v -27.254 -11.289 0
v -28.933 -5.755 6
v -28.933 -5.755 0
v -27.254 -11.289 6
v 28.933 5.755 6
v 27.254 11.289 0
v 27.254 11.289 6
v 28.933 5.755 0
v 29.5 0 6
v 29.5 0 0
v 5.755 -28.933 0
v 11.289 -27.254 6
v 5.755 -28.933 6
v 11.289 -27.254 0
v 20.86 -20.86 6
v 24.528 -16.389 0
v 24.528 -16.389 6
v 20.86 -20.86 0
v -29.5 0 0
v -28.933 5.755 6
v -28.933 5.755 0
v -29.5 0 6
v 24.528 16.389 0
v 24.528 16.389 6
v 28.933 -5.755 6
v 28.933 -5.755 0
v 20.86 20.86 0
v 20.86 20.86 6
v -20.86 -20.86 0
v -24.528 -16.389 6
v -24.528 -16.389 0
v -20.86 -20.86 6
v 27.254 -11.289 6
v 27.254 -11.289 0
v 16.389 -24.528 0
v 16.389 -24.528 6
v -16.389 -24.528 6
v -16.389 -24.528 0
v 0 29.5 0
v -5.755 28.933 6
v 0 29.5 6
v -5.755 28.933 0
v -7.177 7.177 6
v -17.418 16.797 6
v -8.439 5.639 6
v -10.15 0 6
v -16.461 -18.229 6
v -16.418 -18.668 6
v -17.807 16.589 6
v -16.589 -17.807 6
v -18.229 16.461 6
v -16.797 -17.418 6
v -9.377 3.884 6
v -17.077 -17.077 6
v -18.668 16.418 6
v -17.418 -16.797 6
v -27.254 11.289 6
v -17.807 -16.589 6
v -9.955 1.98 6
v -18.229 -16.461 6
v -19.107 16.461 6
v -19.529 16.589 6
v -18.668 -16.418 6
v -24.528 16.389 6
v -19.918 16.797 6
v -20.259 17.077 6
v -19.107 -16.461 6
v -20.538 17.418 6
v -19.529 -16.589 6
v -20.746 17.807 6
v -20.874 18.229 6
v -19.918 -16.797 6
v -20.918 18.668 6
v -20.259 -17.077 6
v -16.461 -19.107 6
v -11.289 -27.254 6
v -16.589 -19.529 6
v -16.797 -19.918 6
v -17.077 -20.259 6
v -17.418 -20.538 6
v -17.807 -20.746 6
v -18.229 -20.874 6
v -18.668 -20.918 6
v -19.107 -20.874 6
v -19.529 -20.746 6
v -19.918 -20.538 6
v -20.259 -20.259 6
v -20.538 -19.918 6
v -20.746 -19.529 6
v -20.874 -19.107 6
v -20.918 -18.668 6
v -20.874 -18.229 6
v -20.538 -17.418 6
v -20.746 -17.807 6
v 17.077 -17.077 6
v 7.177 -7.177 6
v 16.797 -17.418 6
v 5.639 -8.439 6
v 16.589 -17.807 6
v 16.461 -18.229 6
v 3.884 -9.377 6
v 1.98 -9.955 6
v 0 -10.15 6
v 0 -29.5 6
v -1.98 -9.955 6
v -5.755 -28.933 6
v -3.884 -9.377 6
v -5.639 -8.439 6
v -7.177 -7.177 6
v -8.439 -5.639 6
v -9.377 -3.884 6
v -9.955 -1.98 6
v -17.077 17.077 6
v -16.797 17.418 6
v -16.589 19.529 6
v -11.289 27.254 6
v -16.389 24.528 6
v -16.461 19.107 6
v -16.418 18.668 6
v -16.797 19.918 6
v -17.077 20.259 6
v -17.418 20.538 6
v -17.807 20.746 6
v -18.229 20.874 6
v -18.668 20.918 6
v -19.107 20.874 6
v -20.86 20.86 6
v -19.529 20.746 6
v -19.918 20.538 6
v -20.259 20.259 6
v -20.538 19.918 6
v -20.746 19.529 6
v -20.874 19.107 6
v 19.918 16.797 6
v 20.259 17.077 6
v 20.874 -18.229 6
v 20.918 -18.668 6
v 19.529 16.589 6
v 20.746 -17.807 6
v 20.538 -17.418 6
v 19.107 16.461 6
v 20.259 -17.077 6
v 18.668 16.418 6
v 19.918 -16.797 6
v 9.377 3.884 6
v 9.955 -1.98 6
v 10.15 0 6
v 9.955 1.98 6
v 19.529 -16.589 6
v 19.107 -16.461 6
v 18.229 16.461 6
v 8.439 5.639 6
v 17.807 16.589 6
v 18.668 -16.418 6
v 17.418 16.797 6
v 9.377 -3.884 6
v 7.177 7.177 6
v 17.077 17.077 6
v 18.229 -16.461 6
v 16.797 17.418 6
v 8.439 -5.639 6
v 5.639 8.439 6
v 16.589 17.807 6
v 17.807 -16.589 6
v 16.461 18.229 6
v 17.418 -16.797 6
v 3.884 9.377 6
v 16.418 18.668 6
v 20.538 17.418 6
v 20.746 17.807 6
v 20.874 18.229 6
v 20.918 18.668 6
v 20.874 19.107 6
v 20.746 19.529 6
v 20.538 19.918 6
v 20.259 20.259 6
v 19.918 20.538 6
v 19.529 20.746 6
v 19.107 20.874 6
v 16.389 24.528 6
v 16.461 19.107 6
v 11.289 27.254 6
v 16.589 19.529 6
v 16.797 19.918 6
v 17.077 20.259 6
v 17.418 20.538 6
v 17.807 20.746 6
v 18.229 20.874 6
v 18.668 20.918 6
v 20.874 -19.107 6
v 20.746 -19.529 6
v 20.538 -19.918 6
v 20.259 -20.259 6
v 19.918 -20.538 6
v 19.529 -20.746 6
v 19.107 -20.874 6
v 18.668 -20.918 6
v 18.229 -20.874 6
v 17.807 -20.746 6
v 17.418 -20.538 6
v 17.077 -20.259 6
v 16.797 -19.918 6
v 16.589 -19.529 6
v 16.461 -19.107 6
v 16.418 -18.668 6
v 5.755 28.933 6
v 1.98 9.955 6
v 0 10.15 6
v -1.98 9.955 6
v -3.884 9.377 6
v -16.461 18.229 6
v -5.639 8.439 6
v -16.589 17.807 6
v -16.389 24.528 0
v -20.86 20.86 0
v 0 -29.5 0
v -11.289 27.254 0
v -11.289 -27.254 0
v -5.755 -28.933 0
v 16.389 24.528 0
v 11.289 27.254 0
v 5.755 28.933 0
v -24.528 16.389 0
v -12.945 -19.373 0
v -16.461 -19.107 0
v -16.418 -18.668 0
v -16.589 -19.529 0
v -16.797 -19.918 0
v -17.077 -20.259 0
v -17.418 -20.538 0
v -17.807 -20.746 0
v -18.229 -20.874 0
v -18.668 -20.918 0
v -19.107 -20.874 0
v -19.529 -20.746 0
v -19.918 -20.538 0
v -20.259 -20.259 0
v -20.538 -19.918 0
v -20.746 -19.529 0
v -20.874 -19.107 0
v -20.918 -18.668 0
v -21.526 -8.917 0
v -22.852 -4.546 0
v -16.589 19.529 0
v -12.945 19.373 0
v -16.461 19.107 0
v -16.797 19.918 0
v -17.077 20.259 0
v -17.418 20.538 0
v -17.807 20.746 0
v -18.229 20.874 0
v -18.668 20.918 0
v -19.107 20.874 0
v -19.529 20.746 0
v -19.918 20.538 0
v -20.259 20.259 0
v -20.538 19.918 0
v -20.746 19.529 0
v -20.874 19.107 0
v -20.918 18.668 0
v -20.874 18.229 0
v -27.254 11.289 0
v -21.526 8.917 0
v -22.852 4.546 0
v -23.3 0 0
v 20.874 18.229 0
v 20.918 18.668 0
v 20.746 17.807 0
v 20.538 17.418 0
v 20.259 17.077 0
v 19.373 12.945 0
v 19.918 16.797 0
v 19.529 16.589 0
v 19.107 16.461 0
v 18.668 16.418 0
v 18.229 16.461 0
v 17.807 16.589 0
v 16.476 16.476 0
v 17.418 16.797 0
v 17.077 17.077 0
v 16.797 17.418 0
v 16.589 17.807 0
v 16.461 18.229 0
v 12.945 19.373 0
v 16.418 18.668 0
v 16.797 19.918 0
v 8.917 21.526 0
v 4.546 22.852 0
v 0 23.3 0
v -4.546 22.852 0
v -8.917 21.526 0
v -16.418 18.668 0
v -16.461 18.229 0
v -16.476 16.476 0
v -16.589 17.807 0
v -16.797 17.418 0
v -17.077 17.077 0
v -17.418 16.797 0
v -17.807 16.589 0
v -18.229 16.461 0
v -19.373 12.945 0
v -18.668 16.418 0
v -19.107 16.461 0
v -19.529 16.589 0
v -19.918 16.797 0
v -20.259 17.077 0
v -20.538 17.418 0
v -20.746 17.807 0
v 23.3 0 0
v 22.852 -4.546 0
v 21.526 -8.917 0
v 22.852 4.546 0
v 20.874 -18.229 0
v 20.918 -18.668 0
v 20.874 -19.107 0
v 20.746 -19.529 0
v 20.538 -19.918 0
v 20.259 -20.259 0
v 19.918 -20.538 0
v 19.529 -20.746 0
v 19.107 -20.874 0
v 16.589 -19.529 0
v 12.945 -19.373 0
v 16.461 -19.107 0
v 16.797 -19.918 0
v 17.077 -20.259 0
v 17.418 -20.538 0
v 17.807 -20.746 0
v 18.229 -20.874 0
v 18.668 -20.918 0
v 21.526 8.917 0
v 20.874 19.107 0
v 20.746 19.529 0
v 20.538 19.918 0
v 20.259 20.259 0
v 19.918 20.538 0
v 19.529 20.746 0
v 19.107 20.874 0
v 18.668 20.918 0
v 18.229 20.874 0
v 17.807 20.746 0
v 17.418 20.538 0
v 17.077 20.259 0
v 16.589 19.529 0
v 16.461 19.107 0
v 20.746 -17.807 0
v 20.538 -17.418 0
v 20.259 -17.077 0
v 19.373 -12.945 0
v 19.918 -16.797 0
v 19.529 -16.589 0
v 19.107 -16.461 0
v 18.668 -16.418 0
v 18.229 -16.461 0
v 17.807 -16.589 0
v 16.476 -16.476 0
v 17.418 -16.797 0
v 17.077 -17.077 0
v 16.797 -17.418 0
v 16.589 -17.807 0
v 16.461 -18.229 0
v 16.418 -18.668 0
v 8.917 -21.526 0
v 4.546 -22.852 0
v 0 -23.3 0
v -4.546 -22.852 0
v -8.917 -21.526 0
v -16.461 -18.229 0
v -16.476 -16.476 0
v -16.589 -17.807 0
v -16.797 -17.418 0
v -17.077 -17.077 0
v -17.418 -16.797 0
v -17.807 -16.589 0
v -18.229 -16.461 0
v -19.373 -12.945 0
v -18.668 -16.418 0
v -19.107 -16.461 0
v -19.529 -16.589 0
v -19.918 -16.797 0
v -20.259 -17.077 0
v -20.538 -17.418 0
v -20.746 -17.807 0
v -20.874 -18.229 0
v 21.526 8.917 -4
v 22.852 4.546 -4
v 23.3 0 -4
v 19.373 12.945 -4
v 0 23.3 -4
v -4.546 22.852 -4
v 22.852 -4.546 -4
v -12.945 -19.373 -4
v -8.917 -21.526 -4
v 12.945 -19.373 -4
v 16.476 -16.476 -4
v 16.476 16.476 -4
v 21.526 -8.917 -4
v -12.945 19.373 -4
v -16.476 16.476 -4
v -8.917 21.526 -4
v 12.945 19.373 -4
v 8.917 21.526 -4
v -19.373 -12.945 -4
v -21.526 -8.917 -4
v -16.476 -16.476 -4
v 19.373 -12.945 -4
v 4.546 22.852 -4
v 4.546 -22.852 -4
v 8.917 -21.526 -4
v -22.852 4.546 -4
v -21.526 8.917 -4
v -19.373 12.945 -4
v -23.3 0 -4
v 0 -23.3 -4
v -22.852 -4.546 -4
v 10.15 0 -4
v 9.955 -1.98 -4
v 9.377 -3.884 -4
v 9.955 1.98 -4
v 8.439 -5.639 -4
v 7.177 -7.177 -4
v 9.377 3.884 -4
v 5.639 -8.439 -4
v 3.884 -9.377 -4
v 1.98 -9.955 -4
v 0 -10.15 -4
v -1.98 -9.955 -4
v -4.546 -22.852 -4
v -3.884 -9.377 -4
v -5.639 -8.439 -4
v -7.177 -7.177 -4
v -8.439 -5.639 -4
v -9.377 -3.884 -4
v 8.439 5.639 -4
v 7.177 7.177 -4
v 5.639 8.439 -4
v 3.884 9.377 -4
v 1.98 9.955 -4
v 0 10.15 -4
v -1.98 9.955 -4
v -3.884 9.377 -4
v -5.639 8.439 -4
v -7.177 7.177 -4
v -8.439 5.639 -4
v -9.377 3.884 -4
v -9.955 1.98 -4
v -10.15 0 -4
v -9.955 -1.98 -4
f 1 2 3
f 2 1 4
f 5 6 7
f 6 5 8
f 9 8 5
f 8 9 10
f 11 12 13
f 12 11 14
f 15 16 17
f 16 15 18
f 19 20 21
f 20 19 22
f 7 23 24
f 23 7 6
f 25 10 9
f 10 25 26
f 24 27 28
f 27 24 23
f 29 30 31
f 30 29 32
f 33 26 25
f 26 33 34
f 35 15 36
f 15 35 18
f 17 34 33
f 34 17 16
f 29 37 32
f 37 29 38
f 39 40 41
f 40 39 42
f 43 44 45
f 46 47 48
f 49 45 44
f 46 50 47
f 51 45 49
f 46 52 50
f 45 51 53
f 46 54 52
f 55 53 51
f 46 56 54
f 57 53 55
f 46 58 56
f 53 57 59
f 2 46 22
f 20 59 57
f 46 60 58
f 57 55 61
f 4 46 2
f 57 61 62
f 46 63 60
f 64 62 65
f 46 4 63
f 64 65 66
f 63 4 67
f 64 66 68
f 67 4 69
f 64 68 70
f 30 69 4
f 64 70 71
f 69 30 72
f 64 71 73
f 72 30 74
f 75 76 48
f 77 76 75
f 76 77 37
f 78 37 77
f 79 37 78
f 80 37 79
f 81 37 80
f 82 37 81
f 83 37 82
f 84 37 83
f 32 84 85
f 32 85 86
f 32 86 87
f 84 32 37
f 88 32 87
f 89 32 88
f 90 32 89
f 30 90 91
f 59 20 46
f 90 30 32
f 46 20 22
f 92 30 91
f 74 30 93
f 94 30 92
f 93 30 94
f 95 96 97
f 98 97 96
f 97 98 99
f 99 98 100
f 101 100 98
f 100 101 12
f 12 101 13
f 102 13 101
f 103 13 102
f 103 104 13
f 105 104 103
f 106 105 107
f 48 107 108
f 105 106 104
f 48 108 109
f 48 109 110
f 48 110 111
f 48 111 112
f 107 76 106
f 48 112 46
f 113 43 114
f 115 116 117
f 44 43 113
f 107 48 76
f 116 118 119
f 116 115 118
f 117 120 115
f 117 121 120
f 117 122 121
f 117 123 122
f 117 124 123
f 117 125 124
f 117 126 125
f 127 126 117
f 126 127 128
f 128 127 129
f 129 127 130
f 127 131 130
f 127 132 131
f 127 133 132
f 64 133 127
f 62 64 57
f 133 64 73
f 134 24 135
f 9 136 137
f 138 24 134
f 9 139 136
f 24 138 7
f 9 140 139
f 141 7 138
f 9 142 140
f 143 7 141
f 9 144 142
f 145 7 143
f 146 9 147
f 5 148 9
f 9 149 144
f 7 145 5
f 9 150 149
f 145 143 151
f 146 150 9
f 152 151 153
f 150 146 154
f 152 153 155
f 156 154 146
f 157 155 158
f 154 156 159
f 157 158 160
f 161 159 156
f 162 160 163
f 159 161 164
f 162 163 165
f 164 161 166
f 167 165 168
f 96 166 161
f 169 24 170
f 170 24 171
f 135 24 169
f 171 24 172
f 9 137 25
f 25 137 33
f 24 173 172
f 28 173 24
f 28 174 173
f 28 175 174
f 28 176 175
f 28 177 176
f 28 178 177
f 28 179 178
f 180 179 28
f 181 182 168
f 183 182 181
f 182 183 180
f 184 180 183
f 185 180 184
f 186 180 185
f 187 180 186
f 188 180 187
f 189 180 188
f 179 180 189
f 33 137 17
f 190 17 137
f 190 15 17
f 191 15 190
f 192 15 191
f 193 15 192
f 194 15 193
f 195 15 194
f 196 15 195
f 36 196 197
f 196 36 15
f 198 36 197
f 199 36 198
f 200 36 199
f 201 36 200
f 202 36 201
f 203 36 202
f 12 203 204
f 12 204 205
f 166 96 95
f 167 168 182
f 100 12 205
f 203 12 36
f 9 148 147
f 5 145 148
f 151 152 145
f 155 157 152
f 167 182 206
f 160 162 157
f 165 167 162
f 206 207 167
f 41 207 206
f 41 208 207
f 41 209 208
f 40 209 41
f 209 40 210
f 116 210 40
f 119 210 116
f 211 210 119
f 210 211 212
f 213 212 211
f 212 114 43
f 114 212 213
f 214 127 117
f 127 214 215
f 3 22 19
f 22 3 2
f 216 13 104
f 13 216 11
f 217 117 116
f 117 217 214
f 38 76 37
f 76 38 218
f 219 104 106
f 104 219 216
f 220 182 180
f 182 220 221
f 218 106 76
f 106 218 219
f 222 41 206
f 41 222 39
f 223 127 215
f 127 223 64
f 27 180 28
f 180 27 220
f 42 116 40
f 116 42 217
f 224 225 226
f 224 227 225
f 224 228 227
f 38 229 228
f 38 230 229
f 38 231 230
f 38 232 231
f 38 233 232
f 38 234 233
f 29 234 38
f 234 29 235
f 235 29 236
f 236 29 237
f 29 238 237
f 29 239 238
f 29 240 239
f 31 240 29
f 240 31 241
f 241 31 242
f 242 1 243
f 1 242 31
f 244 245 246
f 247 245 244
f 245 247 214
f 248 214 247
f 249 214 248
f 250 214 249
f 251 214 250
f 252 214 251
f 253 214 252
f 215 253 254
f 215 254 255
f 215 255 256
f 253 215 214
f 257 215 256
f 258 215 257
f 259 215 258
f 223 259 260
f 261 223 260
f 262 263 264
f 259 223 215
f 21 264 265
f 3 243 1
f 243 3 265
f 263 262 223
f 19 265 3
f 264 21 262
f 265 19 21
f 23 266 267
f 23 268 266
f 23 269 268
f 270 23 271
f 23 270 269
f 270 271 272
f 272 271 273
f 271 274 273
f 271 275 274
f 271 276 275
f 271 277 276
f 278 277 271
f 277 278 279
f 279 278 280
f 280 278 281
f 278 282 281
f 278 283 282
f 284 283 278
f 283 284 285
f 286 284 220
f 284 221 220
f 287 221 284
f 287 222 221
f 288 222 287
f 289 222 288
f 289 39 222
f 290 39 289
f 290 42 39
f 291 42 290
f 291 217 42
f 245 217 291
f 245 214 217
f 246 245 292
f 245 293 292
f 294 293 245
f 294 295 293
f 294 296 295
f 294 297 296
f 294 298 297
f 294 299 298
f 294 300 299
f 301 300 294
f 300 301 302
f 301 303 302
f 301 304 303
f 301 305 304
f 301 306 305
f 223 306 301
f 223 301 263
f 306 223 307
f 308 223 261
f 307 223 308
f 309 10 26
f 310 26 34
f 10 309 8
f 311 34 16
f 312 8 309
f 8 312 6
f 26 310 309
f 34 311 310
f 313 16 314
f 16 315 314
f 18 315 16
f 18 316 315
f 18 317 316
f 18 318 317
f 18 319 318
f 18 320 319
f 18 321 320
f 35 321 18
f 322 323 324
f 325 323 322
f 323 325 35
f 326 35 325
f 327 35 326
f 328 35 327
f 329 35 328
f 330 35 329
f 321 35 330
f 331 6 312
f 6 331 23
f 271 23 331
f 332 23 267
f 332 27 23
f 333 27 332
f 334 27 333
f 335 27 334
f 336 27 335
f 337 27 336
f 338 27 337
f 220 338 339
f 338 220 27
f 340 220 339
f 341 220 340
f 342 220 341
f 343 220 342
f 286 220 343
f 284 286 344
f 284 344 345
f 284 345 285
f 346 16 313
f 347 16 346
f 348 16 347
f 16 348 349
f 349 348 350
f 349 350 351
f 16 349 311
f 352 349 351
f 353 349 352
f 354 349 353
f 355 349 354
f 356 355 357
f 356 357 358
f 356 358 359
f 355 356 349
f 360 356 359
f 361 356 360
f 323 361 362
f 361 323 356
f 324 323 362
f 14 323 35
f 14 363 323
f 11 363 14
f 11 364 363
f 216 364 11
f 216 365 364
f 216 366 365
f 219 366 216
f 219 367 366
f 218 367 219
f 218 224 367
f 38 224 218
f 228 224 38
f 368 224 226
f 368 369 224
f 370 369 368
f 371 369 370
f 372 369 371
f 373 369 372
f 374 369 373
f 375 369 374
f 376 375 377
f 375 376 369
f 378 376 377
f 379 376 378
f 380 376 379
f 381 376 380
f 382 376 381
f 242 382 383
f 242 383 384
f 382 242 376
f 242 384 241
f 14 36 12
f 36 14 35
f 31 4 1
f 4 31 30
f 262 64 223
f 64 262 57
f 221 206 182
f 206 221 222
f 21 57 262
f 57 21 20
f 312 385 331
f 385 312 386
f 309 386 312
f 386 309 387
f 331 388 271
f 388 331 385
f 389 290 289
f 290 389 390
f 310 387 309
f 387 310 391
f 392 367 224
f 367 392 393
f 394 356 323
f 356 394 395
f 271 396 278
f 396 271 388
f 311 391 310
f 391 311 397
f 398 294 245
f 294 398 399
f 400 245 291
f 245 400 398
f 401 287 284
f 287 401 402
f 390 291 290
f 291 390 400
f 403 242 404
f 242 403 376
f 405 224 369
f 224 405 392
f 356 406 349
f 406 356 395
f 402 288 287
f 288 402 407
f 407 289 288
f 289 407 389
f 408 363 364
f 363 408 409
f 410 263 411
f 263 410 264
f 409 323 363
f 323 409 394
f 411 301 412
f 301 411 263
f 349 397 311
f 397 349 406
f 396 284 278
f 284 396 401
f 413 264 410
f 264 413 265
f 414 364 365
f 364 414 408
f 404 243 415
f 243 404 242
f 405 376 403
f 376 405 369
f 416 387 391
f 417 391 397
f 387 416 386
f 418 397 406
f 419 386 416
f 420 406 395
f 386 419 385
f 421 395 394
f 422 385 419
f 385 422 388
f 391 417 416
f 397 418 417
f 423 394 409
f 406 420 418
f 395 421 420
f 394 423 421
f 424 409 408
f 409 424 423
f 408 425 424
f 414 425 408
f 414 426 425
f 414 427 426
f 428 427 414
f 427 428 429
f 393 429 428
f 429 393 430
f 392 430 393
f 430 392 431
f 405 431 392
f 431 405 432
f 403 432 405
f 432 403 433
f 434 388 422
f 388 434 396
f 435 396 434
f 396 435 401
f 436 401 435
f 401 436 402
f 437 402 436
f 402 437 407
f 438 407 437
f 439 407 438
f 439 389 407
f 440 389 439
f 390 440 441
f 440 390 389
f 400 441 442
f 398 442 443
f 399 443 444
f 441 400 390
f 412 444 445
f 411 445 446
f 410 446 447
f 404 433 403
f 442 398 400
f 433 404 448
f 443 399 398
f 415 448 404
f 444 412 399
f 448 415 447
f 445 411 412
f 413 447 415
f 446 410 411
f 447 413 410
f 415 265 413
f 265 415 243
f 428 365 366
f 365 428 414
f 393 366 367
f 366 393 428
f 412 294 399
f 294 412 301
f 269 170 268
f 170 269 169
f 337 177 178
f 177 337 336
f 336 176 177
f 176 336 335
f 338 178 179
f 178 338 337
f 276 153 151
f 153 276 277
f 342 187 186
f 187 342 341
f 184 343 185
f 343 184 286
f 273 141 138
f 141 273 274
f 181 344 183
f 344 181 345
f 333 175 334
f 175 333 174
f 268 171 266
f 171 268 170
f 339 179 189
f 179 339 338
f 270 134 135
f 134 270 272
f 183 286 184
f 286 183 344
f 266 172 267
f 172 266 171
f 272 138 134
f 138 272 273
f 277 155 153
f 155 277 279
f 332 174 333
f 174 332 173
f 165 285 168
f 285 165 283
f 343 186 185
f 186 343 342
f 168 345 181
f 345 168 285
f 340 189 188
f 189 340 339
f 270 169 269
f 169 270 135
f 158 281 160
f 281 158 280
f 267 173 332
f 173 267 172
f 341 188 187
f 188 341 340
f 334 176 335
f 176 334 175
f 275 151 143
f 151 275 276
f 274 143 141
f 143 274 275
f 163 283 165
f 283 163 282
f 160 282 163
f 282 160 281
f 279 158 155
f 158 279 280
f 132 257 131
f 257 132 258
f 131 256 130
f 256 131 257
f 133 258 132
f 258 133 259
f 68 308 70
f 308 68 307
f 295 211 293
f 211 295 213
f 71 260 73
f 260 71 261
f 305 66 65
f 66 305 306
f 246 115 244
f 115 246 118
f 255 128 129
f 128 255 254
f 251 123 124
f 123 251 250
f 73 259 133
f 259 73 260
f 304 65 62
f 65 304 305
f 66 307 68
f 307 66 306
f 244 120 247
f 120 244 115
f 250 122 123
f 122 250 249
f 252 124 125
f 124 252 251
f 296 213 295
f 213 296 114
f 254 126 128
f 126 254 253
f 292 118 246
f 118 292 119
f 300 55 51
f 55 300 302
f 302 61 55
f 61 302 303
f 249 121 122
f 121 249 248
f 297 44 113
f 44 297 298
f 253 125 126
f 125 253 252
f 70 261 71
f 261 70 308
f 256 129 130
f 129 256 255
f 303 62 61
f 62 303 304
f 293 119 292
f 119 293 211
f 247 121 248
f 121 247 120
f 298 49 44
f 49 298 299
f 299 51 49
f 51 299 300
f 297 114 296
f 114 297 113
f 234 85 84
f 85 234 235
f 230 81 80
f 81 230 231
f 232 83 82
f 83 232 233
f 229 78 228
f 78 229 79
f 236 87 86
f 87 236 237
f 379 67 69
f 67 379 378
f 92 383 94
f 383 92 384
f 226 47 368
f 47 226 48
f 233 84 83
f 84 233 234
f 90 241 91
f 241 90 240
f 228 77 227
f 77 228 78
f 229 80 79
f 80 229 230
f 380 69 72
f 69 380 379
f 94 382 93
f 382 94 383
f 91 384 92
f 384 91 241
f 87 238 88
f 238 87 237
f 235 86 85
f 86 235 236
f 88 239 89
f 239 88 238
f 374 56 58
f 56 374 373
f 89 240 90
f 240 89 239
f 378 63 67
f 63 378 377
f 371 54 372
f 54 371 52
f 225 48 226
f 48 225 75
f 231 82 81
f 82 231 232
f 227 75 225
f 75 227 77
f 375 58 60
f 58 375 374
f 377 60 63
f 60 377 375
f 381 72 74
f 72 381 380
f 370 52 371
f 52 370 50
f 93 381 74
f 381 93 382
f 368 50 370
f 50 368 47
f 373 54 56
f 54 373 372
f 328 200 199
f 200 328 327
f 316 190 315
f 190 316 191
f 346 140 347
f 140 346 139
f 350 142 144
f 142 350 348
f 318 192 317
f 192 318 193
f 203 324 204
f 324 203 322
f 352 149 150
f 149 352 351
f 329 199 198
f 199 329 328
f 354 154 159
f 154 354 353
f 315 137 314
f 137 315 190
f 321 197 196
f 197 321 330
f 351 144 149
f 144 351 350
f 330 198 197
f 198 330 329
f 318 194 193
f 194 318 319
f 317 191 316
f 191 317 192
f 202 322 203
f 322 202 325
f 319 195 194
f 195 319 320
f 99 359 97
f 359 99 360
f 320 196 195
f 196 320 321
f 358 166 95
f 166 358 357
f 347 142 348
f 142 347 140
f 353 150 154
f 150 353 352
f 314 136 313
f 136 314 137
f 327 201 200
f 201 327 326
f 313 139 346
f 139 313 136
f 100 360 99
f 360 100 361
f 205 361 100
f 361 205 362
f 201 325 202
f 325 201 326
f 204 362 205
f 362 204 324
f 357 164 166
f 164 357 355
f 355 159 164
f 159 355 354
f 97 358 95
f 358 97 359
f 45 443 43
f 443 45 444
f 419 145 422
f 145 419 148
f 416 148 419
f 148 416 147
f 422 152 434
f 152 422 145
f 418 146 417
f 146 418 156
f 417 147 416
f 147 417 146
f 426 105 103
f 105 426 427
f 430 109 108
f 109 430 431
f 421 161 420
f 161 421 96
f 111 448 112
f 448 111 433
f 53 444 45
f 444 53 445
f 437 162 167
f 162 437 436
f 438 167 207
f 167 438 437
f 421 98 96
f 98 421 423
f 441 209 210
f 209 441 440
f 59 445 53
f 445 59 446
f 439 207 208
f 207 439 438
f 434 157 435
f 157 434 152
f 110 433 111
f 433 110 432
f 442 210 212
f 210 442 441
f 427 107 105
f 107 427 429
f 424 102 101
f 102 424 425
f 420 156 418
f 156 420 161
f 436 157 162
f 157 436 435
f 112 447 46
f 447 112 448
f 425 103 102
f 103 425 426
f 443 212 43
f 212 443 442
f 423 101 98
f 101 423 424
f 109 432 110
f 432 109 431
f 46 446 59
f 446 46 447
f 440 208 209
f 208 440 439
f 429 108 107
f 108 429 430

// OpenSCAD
$fn = 32;

// ----------------------------------------------------------------------
// Retaining cap: 6204 cover, 59 mm, spigot 46.6 mm
// ----------------------------------------------------------------------

// --- parameters (mm) ---
plate_d = 59;             // cover diameter
plate_t = 6;              // cover thickness
boss_d = 46.6;            // spigot that enters the housing
boss_h = 4;               // spigot height
shaft_d = 20.3;           // shaft opening
bolt_d = 4.5;             // bolt clearance
bolt_r = 26.4;            // bolt circle radius

module cover() {
  cylinder(h = plate_t, d = plate_d);
}

module spigot() {
  /* sunk 1 mm into the cover; the spigot sets the overall height */
  translate([0, 0, -boss_h]) cylinder(h = boss_h + 1, d = boss_d);
}

difference() {
  union() {
    cover();
    spigot();
  }
  for (i = [0 : 3]) rotate([0, 0, 45 + i * 90]) translate([bolt_r, 0, -boss_h - 1])
    cylinder(h = boss_h + plate_t + 2, d = bolt_d);
  translate([0, 0, -boss_h - 1]) cylinder(h = boss_h + plate_t + 2, d = shaft_d);
}
